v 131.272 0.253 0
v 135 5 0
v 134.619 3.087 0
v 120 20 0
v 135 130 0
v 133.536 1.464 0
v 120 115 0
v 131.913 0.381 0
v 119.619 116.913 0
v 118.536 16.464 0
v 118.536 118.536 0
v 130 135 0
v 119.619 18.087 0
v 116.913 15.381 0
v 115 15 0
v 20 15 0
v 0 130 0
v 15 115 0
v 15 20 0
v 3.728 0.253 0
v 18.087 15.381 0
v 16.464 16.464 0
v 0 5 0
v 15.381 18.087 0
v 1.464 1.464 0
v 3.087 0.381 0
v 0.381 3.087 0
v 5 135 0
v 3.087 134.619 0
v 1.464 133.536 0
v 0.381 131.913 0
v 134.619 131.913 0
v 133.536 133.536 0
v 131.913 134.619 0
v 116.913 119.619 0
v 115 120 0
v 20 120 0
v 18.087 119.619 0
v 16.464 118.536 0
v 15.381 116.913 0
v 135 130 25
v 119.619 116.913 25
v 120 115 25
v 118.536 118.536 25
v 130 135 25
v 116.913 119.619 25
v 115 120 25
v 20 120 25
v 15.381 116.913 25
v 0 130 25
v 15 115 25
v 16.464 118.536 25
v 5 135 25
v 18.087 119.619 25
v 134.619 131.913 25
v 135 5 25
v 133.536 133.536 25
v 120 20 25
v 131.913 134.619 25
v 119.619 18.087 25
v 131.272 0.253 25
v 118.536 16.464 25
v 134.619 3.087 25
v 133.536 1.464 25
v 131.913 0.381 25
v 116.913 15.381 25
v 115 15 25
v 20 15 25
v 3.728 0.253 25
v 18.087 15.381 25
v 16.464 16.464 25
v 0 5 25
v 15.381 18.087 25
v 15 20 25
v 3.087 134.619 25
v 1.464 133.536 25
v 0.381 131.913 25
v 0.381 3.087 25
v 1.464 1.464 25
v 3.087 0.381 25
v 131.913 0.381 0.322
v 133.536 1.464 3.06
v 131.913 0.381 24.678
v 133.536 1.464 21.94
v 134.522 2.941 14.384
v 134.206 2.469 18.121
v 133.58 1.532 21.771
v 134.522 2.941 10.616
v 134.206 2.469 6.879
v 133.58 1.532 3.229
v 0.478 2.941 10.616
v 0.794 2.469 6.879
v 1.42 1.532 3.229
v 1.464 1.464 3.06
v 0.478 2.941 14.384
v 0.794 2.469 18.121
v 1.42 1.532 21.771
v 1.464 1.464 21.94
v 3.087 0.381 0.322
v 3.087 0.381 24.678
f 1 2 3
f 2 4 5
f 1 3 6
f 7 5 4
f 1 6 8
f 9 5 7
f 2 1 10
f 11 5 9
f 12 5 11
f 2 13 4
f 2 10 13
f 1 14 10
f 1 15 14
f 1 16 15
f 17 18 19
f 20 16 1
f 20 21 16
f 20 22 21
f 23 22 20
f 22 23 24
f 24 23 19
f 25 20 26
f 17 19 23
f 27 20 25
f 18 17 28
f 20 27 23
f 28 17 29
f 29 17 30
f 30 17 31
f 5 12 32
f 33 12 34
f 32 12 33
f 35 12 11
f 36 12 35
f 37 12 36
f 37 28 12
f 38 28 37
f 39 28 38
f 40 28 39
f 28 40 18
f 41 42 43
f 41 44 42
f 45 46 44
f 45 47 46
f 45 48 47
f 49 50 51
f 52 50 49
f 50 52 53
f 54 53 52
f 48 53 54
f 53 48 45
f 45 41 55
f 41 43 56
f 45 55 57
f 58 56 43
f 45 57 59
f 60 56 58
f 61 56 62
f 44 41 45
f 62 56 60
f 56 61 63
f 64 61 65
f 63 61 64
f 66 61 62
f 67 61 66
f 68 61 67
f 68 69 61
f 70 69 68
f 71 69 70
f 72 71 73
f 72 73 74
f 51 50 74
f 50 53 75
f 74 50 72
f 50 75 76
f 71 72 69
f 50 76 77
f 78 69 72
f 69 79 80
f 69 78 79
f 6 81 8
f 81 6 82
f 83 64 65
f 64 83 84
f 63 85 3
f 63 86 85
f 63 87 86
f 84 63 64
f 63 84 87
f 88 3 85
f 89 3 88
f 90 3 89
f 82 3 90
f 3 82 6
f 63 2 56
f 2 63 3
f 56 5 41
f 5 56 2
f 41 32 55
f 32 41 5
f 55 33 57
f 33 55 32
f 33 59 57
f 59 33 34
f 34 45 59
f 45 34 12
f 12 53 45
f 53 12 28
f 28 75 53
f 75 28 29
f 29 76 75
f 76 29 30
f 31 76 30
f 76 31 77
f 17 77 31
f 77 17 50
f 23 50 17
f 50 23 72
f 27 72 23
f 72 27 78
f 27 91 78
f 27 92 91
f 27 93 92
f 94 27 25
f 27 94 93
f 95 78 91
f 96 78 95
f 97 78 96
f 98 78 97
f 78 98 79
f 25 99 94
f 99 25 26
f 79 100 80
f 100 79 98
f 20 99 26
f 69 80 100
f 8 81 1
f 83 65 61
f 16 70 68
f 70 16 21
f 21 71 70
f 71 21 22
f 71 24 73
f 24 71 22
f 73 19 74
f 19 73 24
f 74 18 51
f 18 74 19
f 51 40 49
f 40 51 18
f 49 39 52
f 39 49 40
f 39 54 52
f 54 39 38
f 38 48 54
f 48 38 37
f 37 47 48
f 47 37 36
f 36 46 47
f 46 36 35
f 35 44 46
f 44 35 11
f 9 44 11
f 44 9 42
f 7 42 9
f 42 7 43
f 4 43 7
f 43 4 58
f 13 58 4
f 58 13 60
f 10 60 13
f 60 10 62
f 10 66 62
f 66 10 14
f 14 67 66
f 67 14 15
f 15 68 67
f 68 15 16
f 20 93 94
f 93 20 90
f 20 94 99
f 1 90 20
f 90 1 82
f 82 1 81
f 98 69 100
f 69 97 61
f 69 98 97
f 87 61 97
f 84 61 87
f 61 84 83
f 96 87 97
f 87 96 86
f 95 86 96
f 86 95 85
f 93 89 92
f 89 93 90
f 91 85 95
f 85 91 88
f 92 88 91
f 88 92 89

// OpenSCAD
w=135;
h=135;

difference(){
  linear_extrude(height=25, center=false){
    difference(){
      translate([5,5,0]) {
        minkowski(){
          square(size=[w-10,h-10]);
          circle(r=5);
        }
      }
       color("red") 
      translate([5+15,5+15,0]) {
          
          minkowski(){
            square(size=[w-40,h-40]);
            circle(r=5);
          }
        
      }
      
      

    }
  }

  translate([-1,-27,12.5])
  rotate([0,90,0])
  cylinder(r=30,h=w+2, $fn=50);
}
